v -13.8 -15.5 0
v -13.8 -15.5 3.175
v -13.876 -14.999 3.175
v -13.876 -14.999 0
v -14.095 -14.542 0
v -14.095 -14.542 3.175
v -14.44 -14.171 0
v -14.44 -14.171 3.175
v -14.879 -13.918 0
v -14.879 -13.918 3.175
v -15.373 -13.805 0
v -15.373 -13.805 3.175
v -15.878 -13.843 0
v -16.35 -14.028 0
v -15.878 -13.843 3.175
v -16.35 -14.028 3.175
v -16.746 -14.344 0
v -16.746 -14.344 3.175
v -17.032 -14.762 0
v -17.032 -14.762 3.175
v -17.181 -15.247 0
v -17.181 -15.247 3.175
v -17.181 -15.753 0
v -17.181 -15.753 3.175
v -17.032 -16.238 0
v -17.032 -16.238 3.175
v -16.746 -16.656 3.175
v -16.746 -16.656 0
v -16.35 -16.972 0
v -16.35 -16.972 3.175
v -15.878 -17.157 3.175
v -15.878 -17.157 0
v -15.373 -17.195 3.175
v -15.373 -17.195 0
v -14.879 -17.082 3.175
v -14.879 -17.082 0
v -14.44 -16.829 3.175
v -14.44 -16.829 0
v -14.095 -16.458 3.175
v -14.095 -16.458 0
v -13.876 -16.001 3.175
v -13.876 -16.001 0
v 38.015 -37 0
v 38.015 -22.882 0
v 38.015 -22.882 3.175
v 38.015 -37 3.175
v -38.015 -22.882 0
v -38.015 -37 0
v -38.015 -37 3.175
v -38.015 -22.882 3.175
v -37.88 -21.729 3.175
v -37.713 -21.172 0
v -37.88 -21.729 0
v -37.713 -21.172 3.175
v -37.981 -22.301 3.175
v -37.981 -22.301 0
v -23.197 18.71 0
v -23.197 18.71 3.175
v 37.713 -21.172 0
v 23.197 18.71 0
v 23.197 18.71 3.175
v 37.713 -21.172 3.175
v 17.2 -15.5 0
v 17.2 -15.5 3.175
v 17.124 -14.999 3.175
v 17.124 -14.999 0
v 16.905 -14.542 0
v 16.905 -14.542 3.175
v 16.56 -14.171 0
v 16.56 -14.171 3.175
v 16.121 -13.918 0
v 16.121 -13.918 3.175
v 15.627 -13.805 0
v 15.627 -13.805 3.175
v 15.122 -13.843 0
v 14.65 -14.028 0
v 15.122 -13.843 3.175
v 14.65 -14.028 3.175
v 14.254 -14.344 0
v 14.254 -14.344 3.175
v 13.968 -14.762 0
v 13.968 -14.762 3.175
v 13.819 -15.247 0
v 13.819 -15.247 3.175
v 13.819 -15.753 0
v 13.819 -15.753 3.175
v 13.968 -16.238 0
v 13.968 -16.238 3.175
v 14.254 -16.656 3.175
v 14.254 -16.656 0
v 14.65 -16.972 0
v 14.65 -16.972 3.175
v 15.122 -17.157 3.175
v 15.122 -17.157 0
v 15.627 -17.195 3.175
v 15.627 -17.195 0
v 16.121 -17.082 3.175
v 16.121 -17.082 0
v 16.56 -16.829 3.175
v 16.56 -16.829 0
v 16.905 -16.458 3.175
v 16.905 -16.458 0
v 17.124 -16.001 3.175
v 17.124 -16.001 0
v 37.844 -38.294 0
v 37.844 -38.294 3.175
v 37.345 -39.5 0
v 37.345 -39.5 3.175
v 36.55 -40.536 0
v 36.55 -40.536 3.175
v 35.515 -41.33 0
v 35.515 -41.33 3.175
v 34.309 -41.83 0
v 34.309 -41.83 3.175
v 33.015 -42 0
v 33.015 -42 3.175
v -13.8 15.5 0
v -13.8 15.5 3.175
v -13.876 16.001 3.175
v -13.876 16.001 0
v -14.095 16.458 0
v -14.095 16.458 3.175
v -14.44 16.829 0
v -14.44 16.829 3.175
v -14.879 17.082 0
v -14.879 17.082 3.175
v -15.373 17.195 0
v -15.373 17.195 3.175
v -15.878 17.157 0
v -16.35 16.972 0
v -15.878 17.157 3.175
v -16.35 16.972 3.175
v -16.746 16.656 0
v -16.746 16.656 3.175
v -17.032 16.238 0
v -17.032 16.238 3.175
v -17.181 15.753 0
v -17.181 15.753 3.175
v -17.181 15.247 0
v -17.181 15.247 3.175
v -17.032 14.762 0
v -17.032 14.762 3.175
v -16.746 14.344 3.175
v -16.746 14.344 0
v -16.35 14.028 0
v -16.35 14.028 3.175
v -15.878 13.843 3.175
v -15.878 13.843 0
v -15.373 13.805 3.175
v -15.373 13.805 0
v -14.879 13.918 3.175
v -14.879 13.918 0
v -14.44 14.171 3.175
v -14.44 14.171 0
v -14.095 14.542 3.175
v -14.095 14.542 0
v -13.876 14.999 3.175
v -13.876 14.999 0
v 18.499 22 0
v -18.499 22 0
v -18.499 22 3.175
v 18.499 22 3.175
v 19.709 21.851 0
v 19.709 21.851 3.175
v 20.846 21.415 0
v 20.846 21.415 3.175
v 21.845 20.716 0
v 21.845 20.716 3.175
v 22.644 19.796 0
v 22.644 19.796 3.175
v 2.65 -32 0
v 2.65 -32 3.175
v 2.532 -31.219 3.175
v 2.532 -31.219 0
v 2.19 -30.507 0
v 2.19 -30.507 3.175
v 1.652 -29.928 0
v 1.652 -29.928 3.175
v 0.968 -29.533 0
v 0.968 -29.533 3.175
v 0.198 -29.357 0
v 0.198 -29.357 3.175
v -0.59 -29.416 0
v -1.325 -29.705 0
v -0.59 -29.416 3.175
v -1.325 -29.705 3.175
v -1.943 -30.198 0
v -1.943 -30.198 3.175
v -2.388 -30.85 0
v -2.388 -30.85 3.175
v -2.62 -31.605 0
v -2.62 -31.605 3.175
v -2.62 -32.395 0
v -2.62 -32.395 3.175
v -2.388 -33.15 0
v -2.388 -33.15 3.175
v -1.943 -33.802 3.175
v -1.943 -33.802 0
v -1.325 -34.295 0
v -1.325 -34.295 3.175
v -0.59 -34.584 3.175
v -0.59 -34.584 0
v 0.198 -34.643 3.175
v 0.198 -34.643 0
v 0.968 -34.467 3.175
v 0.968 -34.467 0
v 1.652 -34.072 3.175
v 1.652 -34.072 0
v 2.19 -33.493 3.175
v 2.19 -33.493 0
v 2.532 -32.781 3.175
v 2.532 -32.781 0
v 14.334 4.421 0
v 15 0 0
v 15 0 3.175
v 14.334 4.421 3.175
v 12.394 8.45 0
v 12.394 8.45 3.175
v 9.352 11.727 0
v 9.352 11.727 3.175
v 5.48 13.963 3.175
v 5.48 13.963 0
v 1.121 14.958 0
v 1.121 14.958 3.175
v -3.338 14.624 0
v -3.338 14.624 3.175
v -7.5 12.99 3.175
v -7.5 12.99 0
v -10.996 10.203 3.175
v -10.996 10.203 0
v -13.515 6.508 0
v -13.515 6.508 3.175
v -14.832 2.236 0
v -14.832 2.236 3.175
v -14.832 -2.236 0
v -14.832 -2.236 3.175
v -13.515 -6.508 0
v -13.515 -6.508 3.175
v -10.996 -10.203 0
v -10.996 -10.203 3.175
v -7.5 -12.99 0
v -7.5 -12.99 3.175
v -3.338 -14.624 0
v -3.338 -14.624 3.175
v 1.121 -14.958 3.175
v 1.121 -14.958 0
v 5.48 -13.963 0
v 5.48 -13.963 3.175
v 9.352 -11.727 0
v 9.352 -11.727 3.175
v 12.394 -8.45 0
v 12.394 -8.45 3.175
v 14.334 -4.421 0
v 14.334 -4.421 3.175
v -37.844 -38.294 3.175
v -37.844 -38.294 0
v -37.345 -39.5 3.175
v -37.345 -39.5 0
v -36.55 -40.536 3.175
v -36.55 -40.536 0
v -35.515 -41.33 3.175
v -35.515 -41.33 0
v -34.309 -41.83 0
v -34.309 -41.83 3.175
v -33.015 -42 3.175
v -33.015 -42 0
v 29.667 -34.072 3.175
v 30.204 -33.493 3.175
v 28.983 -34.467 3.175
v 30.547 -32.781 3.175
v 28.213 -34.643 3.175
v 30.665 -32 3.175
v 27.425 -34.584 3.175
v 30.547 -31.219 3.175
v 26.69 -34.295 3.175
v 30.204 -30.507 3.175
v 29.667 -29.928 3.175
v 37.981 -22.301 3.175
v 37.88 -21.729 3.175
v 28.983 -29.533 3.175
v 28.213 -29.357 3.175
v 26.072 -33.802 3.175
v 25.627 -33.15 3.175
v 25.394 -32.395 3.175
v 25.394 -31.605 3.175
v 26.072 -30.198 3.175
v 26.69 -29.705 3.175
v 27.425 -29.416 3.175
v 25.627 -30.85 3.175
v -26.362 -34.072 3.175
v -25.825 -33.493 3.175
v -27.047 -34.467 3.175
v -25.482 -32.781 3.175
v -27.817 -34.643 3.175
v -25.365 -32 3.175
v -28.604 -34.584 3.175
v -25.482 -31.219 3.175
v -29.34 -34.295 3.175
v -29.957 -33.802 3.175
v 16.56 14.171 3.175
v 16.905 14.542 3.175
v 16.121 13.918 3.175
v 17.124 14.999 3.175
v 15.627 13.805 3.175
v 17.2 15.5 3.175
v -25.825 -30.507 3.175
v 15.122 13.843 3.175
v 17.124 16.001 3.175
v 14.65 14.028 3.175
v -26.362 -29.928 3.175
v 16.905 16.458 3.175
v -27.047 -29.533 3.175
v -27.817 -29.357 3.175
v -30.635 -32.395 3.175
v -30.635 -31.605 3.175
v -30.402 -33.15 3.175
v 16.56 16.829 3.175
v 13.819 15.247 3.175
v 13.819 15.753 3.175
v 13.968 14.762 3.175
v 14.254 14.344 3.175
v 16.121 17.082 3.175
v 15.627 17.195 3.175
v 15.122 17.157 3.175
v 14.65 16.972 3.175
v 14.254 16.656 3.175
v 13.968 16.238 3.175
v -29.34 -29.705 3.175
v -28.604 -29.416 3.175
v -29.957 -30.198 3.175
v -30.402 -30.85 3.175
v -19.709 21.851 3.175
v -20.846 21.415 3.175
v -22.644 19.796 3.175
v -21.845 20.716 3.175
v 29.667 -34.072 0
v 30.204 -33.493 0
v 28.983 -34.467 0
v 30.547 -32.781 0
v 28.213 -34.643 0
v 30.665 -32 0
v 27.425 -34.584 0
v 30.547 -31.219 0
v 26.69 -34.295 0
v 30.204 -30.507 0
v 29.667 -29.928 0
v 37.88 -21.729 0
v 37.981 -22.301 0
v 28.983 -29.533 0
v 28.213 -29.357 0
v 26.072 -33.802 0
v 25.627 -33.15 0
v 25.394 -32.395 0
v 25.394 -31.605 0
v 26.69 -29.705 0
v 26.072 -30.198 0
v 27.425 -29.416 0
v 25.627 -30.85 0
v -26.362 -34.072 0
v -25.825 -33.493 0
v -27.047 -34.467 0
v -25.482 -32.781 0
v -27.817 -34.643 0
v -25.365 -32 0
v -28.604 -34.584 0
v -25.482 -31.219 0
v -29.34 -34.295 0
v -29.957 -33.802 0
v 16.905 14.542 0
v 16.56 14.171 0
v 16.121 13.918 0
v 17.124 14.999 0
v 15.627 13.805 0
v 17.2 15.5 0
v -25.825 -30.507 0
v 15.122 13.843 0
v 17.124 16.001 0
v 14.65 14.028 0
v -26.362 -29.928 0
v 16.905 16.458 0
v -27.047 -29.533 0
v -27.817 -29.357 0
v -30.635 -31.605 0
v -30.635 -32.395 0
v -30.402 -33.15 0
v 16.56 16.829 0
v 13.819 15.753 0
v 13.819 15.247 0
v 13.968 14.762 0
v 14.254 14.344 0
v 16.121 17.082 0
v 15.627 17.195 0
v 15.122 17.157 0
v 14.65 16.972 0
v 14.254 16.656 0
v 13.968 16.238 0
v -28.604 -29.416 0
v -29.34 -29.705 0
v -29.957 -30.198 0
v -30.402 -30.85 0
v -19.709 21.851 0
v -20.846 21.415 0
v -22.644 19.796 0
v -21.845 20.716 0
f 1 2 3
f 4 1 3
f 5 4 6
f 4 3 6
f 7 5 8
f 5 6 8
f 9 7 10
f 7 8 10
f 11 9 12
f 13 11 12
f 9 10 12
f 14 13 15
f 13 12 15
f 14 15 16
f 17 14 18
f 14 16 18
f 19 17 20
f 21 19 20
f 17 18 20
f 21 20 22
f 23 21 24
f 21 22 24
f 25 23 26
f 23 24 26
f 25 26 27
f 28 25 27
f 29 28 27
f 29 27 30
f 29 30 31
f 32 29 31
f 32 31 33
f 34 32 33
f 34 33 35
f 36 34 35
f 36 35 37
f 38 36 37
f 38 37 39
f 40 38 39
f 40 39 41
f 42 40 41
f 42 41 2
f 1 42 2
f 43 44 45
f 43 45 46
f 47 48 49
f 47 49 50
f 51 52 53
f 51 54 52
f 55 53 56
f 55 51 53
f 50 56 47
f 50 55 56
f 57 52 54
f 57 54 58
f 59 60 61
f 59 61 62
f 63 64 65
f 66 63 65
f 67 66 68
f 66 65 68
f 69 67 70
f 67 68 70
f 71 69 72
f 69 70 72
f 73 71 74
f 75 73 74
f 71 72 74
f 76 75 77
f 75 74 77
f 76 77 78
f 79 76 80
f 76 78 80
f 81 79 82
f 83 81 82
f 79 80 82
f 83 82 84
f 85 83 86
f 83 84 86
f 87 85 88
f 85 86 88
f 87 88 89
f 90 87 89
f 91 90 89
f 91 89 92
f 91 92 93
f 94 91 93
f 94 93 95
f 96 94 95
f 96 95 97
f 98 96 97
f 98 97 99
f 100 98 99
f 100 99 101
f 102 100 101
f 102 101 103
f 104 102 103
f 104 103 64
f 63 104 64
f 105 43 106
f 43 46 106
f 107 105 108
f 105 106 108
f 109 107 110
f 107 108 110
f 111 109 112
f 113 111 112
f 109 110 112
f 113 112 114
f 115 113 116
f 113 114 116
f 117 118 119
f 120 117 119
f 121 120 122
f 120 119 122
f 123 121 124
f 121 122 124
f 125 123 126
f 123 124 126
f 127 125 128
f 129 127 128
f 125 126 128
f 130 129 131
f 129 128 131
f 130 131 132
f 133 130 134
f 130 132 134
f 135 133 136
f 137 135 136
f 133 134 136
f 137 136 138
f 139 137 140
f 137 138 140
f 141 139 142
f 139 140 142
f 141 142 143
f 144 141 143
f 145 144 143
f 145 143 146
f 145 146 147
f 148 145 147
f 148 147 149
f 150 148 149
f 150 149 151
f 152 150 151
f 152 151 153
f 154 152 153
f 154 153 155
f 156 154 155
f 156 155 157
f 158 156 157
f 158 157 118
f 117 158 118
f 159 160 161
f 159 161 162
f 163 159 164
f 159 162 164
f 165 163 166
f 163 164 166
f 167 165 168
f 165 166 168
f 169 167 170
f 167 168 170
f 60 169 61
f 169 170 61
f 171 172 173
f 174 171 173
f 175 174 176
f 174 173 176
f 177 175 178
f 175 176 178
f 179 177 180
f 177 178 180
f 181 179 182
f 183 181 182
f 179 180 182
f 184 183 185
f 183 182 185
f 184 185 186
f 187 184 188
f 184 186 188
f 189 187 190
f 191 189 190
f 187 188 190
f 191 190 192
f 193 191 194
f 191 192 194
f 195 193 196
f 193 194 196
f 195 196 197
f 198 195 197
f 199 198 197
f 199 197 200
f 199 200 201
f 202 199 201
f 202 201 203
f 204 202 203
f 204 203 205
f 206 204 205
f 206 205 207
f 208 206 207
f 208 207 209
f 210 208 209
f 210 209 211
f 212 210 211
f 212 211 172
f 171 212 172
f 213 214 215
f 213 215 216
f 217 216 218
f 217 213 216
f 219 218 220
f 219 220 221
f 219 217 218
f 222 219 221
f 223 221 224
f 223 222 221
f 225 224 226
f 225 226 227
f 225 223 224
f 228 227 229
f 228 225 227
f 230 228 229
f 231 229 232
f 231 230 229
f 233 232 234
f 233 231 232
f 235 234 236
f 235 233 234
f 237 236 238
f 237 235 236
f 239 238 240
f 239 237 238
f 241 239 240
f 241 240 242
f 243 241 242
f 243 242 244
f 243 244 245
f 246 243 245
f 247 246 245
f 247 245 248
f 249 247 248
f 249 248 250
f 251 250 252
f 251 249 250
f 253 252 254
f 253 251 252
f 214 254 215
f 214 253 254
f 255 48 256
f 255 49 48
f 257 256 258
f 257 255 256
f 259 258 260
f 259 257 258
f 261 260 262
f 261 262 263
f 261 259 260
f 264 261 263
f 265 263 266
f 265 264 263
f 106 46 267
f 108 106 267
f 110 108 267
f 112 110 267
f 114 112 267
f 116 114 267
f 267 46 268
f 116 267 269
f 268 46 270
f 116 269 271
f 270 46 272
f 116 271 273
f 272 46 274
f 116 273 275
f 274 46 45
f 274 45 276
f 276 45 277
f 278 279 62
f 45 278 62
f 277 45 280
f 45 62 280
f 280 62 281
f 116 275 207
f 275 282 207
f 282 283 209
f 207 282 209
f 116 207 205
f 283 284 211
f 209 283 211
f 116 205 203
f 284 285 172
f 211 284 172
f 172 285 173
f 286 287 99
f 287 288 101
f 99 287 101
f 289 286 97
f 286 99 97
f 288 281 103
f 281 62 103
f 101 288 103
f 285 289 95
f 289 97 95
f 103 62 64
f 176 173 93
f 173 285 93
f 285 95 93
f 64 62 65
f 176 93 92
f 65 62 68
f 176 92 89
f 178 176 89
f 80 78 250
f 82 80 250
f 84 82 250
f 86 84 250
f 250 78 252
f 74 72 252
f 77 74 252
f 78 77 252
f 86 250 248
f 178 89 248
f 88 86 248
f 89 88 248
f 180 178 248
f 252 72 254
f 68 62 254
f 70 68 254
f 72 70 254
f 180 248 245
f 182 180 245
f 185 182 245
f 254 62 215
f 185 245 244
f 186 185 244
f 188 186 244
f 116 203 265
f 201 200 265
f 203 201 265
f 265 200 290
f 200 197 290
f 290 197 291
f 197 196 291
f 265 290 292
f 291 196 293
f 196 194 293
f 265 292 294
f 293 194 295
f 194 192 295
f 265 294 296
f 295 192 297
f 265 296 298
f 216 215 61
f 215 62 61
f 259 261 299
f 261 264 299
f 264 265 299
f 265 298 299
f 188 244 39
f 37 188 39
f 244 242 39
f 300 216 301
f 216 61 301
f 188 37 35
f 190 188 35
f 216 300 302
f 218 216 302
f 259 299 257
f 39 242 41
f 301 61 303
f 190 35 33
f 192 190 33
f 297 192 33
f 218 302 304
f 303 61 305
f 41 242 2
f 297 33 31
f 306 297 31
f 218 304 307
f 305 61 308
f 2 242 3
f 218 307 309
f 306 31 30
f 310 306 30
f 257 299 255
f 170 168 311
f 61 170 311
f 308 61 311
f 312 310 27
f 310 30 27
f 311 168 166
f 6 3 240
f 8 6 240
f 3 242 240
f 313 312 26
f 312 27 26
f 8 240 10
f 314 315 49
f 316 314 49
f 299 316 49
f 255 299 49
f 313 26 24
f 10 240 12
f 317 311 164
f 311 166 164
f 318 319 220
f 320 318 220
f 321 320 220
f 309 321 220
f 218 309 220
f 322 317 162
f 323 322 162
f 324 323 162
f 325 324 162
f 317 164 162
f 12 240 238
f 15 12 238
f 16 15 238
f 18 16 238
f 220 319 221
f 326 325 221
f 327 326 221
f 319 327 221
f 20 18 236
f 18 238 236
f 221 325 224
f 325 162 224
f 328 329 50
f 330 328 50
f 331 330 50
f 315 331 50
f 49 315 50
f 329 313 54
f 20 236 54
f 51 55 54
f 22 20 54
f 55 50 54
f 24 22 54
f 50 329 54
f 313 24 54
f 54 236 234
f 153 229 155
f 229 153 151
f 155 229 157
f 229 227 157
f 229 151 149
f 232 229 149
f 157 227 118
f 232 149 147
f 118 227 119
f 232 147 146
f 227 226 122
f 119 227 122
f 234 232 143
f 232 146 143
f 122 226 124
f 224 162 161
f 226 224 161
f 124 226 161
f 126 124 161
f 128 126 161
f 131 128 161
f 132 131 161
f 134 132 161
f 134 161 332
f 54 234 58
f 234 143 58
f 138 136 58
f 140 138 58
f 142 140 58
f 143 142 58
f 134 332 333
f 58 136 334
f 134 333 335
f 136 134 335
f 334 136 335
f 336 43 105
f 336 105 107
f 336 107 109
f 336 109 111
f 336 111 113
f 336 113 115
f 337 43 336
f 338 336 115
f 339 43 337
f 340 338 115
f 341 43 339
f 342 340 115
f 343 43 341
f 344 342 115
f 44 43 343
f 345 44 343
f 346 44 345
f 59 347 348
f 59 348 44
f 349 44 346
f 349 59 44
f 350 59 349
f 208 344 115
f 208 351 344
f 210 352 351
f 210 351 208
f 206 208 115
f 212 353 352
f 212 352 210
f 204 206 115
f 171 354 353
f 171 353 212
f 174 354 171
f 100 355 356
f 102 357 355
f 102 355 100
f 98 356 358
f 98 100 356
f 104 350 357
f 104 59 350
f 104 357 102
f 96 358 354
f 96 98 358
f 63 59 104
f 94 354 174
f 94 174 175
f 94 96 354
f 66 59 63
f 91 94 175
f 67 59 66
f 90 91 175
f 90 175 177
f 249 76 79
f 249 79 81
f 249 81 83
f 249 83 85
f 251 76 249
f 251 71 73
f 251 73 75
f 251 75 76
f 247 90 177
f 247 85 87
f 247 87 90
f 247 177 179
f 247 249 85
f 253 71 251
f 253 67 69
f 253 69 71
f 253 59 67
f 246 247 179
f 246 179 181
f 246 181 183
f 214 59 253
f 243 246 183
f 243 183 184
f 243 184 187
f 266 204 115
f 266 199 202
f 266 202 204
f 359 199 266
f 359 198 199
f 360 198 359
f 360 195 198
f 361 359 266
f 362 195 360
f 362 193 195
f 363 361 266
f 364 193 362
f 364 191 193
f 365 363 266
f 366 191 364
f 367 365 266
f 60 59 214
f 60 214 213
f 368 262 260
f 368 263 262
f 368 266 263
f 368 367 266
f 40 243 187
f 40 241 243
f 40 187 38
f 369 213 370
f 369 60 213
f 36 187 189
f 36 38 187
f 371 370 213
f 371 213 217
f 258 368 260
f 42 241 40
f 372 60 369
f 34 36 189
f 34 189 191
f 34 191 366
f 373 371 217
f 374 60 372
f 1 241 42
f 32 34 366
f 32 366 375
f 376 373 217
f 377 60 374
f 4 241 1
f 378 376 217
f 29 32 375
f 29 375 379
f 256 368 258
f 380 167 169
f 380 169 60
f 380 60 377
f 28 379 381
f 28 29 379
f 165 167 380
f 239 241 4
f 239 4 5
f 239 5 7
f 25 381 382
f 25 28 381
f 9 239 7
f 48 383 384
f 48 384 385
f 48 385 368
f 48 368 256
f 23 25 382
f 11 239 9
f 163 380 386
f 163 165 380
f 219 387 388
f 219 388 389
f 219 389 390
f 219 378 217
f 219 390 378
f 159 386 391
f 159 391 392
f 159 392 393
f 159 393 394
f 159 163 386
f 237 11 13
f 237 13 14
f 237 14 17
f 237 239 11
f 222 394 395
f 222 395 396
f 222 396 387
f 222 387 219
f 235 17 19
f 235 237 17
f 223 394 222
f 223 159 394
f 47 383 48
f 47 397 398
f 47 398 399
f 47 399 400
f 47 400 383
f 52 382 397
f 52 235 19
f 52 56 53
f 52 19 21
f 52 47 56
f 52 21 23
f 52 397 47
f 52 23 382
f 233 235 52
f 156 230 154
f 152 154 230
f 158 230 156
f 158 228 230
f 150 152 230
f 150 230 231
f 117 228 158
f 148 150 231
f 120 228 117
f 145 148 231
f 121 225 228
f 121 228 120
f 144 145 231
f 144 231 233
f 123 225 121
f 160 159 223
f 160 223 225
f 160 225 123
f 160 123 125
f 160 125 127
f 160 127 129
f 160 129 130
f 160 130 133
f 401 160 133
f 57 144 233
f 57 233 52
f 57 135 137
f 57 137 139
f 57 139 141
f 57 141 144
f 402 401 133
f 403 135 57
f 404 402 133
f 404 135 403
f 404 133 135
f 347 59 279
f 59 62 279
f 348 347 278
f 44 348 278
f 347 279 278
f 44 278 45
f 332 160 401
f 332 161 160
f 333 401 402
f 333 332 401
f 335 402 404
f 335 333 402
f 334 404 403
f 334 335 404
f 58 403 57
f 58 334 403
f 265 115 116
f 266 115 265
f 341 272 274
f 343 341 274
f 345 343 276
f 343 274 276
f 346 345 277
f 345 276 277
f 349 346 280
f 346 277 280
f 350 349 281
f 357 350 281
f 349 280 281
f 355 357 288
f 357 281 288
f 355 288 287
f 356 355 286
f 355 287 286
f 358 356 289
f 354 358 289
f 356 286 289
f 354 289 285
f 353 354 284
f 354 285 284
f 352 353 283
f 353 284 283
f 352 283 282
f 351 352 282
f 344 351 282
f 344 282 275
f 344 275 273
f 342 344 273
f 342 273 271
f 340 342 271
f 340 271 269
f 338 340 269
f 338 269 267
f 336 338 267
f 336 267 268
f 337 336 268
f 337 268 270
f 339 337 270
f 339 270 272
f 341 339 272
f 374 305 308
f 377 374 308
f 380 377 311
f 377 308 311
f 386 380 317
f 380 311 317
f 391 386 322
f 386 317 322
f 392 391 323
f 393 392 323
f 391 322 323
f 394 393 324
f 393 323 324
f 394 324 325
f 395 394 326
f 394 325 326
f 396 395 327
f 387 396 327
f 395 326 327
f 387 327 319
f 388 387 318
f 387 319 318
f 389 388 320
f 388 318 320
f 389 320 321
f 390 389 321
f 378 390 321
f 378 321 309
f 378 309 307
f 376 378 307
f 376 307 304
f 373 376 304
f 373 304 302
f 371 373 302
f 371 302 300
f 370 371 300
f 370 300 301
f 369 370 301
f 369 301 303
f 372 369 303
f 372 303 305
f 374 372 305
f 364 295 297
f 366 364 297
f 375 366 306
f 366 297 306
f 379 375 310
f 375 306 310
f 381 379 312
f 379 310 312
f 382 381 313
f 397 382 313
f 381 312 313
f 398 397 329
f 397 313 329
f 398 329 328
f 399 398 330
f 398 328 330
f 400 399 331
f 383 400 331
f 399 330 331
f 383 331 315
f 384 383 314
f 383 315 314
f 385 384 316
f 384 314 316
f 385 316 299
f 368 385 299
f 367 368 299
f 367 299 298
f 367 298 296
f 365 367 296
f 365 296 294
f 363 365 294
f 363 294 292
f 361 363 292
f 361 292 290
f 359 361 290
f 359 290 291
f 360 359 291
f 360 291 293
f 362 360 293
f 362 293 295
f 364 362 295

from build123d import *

# Parameters (mm, degrees)
SKETCH1_R           = 15
BOSS_EXTRUDE1_DEPTH = 3.175
SKETCH2_R           = 1.7
SKETCH2_R_2         = 2.65
CUT_EXTRUDE1_DEPTH  = 4.175
FILLET1_R           = 5


with BuildPart() as part:
    # Sketch1 → Boss-Extrude1 (new body)
    with BuildSketch(Plane.XY):
        Polygon((-22, 22), (22, 22), (38.014690308, -22), (38.014690308, -42), (-38.014690308, -42), (-38.014690308, -22), align=None)
        Circle(SKETCH1_R, mode=Mode.SUBTRACT)
    extrude(amount=BOSS_EXTRUDE1_DEPTH)

    # Sketch2 → Cut-Extrude1 (cut, through all)
    with BuildSketch(Plane.XY.offset(3.175)):
        with Locations((15.5, 15.5)):
            Circle(SKETCH2_R)
        with Locations((15.5, -15.5)):
            Circle(SKETCH2_R)
        with Locations((-15.5, -15.5)):
            Circle(SKETCH2_R)
        with Locations((-15.5, 15.5)):
            Circle(SKETCH2_R)
        with Locations((0, -32)):
            Circle(SKETCH2_R_2)
        with Locations((28.014690308, -32)):
            Circle(SKETCH2_R_2)
        with Locations((-28.014690308, -32)):
            Circle(SKETCH2_R_2)
    extrude(amount=-CUT_EXTRUDE1_DEPTH, mode=Mode.SUBTRACT)

    # Fillet1
    fillet1_edges = [part.edges().sort_by_distance(p)[0] for p in [
        (38.014690308, -22, 1.5875),
        (38.014690308, -42, 1.5875),
        (-38.014690308, -42, 1.5875),
        (-38.014690308, -22, 1.5875),
        (-22, 22, 1.5875),
        (22, 22, 1.5875),
    ]]
    fillet(fillet1_edges, radius=FILLET1_R)


solid = part.part
